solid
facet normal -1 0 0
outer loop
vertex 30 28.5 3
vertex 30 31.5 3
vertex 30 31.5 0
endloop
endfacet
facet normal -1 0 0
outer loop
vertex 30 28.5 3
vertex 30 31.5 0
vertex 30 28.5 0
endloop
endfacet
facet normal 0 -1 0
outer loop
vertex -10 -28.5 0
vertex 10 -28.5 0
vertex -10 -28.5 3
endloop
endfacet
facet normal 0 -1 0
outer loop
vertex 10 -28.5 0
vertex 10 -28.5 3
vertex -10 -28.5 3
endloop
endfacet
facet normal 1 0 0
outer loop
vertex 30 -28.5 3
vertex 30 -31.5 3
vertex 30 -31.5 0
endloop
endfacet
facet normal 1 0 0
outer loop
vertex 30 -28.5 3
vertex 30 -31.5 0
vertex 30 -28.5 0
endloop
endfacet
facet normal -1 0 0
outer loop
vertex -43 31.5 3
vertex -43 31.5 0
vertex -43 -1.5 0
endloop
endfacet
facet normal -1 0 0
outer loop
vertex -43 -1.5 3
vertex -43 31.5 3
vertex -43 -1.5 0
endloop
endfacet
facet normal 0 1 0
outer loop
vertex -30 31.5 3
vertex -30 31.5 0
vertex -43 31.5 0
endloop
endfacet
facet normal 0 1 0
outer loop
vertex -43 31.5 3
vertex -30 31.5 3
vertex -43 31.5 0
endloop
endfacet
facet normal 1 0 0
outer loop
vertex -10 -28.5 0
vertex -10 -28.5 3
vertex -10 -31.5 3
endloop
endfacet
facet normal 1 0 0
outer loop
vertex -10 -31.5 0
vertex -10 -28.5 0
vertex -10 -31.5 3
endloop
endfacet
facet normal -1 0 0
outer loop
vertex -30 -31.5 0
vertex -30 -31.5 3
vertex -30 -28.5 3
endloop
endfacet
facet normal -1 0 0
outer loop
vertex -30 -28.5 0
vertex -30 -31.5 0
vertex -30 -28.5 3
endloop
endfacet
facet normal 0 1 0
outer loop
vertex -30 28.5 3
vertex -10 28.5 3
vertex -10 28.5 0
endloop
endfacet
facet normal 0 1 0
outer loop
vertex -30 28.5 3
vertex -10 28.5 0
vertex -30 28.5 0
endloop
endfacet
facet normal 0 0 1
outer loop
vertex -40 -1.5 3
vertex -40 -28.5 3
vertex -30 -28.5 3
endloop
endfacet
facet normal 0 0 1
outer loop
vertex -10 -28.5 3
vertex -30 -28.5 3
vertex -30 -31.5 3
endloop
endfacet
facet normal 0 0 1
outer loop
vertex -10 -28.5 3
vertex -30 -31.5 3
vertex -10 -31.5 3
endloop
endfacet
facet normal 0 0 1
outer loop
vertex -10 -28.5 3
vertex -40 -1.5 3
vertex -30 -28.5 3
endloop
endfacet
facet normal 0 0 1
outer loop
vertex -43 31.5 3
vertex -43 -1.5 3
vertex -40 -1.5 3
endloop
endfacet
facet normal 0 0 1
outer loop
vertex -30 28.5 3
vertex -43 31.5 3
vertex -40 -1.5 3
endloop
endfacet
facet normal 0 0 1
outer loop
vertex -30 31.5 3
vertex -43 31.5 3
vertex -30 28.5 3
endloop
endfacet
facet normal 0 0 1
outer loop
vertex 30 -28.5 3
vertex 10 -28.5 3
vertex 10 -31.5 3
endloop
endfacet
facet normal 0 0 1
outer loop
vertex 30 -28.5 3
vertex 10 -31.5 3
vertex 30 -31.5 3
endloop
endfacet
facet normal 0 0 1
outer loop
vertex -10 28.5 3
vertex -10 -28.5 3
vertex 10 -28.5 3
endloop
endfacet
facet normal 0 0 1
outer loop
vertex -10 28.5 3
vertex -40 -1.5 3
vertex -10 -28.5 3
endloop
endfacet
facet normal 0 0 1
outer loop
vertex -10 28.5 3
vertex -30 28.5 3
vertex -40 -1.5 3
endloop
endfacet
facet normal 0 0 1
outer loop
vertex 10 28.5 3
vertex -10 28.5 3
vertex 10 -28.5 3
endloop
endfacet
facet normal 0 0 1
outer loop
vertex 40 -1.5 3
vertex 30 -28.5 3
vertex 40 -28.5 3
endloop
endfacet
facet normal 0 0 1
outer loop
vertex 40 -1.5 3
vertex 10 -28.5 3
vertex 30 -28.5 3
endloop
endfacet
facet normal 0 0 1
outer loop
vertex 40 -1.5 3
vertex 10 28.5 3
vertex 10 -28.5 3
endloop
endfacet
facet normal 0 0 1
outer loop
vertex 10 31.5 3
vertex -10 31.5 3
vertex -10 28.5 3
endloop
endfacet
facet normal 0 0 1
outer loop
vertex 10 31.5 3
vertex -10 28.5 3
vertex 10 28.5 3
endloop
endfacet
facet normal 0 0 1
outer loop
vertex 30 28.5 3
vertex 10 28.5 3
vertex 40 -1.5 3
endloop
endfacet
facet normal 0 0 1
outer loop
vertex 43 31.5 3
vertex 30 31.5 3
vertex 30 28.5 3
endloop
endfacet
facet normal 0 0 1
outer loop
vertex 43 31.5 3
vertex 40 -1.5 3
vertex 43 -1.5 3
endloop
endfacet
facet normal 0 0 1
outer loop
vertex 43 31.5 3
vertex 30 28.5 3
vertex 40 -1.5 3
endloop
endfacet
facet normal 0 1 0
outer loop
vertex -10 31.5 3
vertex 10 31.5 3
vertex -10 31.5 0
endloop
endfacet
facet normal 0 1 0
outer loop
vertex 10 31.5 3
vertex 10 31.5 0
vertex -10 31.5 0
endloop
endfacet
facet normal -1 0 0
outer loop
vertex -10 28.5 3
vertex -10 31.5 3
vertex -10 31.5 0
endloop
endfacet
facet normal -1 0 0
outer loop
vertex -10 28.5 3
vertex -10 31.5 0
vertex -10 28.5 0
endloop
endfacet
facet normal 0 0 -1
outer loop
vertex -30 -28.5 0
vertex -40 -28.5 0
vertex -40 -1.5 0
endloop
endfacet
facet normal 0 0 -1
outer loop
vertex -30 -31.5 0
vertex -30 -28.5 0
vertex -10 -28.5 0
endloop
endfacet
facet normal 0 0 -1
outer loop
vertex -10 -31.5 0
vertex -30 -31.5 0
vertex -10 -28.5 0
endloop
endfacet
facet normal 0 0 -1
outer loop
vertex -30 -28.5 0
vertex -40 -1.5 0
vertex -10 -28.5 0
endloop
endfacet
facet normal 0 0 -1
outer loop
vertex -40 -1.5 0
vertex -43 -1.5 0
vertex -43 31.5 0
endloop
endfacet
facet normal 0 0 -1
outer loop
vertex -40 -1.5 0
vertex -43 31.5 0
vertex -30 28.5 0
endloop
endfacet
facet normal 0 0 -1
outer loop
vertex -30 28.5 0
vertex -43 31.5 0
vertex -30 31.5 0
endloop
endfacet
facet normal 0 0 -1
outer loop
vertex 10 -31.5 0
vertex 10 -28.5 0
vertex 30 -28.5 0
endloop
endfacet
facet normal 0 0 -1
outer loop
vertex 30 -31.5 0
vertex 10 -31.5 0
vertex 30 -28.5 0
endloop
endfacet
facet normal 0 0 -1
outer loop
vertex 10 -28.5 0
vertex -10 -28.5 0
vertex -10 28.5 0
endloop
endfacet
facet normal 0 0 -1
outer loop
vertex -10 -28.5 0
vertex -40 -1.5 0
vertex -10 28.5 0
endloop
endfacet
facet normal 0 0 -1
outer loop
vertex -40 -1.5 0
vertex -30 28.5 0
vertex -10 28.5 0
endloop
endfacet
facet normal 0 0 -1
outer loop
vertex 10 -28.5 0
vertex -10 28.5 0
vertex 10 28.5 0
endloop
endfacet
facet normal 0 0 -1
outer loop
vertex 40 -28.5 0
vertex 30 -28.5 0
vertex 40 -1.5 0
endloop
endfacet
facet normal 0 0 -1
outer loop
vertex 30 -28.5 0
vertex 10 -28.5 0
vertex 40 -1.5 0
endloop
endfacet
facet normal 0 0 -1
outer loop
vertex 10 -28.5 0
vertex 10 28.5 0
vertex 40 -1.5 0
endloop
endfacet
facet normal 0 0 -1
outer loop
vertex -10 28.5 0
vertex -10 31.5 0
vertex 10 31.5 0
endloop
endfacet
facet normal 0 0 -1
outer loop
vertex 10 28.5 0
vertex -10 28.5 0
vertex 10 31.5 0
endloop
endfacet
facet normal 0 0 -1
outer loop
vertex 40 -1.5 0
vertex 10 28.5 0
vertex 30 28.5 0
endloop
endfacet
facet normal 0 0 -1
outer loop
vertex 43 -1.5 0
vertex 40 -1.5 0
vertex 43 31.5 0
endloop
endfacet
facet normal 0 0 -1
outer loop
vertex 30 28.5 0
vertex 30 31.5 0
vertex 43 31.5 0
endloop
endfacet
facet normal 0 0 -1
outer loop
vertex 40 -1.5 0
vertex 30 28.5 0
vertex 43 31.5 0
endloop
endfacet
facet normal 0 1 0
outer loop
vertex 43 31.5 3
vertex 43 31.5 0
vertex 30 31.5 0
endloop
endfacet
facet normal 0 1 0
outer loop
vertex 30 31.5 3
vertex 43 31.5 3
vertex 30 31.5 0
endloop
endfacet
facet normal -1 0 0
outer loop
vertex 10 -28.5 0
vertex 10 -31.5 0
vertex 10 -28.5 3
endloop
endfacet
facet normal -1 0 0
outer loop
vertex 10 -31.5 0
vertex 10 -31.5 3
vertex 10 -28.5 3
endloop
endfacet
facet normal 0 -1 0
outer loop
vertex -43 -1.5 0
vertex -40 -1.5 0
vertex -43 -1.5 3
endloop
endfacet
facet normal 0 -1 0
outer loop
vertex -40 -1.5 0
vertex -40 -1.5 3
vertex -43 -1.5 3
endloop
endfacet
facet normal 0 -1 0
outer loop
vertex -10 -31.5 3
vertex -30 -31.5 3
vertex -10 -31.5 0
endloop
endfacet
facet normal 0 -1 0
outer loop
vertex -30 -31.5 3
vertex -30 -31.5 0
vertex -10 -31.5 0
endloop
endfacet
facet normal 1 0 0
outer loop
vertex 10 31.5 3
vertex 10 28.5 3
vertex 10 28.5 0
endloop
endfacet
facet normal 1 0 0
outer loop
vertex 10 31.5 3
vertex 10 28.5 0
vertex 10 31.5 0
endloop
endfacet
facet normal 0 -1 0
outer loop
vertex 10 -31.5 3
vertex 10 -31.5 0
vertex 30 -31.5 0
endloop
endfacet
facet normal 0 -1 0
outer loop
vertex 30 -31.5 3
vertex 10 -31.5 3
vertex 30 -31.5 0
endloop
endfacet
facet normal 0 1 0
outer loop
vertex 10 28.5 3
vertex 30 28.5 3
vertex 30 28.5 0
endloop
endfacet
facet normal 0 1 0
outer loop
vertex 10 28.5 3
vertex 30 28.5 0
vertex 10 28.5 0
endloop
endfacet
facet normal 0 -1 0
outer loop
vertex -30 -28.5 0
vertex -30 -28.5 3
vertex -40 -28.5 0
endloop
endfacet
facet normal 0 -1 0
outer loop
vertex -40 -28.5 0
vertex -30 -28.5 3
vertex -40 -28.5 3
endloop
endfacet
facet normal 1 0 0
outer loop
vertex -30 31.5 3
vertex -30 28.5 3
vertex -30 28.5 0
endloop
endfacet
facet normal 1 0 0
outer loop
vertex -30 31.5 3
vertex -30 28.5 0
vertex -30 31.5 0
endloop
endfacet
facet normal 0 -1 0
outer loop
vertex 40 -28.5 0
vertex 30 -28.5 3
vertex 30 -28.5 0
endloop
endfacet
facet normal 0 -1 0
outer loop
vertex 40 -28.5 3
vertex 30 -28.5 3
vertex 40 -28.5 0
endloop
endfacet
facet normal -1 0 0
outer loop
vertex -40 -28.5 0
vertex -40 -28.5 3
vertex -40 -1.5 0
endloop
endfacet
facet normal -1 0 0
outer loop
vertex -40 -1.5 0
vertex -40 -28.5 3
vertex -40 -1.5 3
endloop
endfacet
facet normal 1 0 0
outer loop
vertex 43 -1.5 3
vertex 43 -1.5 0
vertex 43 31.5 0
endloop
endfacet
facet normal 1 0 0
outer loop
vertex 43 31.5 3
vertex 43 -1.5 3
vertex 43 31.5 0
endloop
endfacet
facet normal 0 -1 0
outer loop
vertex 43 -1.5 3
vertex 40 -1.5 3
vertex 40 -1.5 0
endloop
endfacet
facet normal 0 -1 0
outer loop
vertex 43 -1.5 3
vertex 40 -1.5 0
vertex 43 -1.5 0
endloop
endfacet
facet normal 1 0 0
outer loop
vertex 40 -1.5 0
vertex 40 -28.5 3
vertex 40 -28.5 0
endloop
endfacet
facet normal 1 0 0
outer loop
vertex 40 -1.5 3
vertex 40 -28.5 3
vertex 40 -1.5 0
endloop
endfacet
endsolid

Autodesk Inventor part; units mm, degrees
ref_plane "YZ Plane" through (0, 0, 0) normal (1, 0, 0) x (0, 1, 0)
ref_plane "XZ Plane" through (0, 0, 0) normal (0, 1, 0) x (-1, 0, 0)
ref_plane "XY Plane" through (0, 0, 0) normal (0, 0, 1) x (1, 0, 0)
sketch "Sketch1" plane through (0, 0, 0) normal (0, 0, 1) x (1, 0, 0)
  point P0 (0, 0)
sketch "Sketch2" plane through (0, 0, 0) normal (0, 0, 1) x (1, 0, 0)
  line L0 (-43, -31.5) -> (43, -31.5)
  line L1 (43, -31.5) -> (43, 31.5)
  line L2 (43, 31.5) -> (-43, 31.5)
  line L3 (-43, 31.5) -> (-43, -31.5)
  line L4 (-43, -31.5) -> (43, 31.5) construction
  line L5 (43, -31.5) -> (-43, 31.5) construction
  point P0 (0, 0)
  dimension "d0" = 86
  dimension "d1" = 63
extrude "Extrusion1" add sketch "Sketch2" along normal blind 3
sketch "Sketch3" plane through (0, 0, 3) normal (0, 0, 1) x (1, 0, 0)
  line L0 (-43, -31.5) -> (43, -31.5) projected
  line L1 (-43, -31.5) -> (-40, -31.5)
  line L2 (-40, -31.5) -> (-40, -1.5)
  line L3 (-40, -1.5) -> (-43, -1.5)
  line L4 (-43, -1.5) -> (-43, -31.5)
  line L5 (43, -31.5) -> (40, -31.5)
  line L6 (40, -31.5) -> (40, -1.5)
  line L7 (40, -1.5) -> (43, -1.5)
  line L8 (43, -1.5) -> (43, -31.5)
  line L9 (-40, -31.5) -> (-30, -31.5)
  line L10 (-30, -31.5) -> (-30, -28.5)
  line L11 (-30, -28.5) -> (-40, -28.5)
  line L12 (-40, -28.5) -> (-40, -31.5)
  line L13 (40, -31.5) -> (30, -31.5)
  line L14 (30, -31.5) -> (30, -28.5)
  line L15 (30, -28.5) -> (40, -28.5)
  line L16 (40, -28.5) -> (40, -31.5)
  line L17 (-10, -31.5) -> (10, -31.5)
  line L18 (10, -31.5) -> (10, -28.5)
  line L19 (10, -28.5) -> (-10, -28.5)
  line L20 (-10, -28.5) -> (-10, -31.5)
  line L21 (43, 31.5) -> (-43, 31.5) projected
  line L22 (-30, 31.5) -> (-10, 31.5)
  line L23 (-10, 31.5) -> (-10, 28.5)
  line L24 (-10, 28.5) -> (-30, 28.5)
  line L25 (-30, 28.5) -> (-30, 31.5)
  line L26 (10, 31.5) -> (30, 31.5)
  line L27 (30, 31.5) -> (30, 28.5)
  line L28 (30, 28.5) -> (10, 28.5)
  line L29 (10, 28.5) -> (10, 31.5)
  point P0 (0, 0)
  dimension "d4" = 3
  dimension "d5" = 3
  dimension "d6" = 10
  dimension "d7" = 3
  dimension "d8" = 10
  dimension "d9" = 3
  dimension "d10" = 20
  dimension "d11" = 3
  dimension "d12" = 20
  dimension "d13" = 3
  dimension "d16" = 30
extrude "Extrusion2" cut sketch "Sketch3" against normal through all
properties part number "cham_back"
